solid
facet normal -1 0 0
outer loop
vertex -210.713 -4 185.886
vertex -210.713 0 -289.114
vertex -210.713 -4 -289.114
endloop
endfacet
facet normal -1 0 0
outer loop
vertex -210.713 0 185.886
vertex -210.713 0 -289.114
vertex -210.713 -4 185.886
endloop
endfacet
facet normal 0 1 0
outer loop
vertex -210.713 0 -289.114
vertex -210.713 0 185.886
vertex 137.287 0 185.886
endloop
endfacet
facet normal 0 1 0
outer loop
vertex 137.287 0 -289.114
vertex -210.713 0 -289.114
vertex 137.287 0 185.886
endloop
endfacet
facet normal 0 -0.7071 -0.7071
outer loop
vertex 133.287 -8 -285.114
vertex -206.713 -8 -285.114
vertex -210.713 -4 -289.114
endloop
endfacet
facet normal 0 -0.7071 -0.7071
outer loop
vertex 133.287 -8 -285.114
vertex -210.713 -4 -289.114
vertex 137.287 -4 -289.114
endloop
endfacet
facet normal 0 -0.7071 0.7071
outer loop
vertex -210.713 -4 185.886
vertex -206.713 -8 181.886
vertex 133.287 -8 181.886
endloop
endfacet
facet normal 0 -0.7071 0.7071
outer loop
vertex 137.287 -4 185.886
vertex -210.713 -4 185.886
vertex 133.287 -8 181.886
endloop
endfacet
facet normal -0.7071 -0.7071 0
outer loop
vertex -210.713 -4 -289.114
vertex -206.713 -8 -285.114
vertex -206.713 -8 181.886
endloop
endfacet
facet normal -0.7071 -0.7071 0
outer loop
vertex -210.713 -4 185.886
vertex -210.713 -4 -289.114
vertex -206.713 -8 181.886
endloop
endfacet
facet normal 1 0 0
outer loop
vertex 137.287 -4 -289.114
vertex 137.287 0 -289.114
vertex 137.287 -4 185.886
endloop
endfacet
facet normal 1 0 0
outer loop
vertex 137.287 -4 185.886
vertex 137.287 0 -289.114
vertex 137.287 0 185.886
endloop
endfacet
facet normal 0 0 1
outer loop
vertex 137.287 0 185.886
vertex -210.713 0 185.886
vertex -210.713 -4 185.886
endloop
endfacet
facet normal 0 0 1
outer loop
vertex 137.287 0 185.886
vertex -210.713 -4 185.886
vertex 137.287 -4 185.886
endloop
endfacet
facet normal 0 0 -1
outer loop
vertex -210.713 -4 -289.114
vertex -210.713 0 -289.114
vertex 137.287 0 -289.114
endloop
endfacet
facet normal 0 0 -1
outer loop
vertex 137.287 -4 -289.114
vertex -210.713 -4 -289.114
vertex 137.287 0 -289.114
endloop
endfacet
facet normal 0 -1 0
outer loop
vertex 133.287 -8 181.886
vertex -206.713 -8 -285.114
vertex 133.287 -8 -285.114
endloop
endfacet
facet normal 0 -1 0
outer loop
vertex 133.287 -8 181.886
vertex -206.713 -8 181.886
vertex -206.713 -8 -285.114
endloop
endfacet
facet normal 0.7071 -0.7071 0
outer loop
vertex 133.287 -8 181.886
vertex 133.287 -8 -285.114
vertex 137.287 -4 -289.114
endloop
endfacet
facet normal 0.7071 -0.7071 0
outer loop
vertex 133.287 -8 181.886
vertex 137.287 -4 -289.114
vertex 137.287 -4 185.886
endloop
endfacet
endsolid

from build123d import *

# Parameters (mm, degrees)
SKETCH_W     = 348
SKETCH_H     = 475
PAD_DEPTH    = 8
CHAMFER_SIZE = 4


with BuildPart() as part:
    # Sketch → Pad (new body)
    with BuildSketch(Plane.XZ):
        with Locations((-36.713229, -51.613825)):
            Rectangle(SKETCH_W, SKETCH_H)
    extrude(amount=PAD_DEPTH)

    # Chamfer
    chamfer_edges = [part.edges().sort_by_distance(p)[0] for p in [
        (-36.713229, -8, -289.113825),
        (137.286771, -8, -51.613825),
        (-36.713229, -8, 185.886175),
        (-210.713229, -8, -51.613825),
    ]]
    chamfer(chamfer_edges, length=CHAMFER_SIZE)


solid = part.part
